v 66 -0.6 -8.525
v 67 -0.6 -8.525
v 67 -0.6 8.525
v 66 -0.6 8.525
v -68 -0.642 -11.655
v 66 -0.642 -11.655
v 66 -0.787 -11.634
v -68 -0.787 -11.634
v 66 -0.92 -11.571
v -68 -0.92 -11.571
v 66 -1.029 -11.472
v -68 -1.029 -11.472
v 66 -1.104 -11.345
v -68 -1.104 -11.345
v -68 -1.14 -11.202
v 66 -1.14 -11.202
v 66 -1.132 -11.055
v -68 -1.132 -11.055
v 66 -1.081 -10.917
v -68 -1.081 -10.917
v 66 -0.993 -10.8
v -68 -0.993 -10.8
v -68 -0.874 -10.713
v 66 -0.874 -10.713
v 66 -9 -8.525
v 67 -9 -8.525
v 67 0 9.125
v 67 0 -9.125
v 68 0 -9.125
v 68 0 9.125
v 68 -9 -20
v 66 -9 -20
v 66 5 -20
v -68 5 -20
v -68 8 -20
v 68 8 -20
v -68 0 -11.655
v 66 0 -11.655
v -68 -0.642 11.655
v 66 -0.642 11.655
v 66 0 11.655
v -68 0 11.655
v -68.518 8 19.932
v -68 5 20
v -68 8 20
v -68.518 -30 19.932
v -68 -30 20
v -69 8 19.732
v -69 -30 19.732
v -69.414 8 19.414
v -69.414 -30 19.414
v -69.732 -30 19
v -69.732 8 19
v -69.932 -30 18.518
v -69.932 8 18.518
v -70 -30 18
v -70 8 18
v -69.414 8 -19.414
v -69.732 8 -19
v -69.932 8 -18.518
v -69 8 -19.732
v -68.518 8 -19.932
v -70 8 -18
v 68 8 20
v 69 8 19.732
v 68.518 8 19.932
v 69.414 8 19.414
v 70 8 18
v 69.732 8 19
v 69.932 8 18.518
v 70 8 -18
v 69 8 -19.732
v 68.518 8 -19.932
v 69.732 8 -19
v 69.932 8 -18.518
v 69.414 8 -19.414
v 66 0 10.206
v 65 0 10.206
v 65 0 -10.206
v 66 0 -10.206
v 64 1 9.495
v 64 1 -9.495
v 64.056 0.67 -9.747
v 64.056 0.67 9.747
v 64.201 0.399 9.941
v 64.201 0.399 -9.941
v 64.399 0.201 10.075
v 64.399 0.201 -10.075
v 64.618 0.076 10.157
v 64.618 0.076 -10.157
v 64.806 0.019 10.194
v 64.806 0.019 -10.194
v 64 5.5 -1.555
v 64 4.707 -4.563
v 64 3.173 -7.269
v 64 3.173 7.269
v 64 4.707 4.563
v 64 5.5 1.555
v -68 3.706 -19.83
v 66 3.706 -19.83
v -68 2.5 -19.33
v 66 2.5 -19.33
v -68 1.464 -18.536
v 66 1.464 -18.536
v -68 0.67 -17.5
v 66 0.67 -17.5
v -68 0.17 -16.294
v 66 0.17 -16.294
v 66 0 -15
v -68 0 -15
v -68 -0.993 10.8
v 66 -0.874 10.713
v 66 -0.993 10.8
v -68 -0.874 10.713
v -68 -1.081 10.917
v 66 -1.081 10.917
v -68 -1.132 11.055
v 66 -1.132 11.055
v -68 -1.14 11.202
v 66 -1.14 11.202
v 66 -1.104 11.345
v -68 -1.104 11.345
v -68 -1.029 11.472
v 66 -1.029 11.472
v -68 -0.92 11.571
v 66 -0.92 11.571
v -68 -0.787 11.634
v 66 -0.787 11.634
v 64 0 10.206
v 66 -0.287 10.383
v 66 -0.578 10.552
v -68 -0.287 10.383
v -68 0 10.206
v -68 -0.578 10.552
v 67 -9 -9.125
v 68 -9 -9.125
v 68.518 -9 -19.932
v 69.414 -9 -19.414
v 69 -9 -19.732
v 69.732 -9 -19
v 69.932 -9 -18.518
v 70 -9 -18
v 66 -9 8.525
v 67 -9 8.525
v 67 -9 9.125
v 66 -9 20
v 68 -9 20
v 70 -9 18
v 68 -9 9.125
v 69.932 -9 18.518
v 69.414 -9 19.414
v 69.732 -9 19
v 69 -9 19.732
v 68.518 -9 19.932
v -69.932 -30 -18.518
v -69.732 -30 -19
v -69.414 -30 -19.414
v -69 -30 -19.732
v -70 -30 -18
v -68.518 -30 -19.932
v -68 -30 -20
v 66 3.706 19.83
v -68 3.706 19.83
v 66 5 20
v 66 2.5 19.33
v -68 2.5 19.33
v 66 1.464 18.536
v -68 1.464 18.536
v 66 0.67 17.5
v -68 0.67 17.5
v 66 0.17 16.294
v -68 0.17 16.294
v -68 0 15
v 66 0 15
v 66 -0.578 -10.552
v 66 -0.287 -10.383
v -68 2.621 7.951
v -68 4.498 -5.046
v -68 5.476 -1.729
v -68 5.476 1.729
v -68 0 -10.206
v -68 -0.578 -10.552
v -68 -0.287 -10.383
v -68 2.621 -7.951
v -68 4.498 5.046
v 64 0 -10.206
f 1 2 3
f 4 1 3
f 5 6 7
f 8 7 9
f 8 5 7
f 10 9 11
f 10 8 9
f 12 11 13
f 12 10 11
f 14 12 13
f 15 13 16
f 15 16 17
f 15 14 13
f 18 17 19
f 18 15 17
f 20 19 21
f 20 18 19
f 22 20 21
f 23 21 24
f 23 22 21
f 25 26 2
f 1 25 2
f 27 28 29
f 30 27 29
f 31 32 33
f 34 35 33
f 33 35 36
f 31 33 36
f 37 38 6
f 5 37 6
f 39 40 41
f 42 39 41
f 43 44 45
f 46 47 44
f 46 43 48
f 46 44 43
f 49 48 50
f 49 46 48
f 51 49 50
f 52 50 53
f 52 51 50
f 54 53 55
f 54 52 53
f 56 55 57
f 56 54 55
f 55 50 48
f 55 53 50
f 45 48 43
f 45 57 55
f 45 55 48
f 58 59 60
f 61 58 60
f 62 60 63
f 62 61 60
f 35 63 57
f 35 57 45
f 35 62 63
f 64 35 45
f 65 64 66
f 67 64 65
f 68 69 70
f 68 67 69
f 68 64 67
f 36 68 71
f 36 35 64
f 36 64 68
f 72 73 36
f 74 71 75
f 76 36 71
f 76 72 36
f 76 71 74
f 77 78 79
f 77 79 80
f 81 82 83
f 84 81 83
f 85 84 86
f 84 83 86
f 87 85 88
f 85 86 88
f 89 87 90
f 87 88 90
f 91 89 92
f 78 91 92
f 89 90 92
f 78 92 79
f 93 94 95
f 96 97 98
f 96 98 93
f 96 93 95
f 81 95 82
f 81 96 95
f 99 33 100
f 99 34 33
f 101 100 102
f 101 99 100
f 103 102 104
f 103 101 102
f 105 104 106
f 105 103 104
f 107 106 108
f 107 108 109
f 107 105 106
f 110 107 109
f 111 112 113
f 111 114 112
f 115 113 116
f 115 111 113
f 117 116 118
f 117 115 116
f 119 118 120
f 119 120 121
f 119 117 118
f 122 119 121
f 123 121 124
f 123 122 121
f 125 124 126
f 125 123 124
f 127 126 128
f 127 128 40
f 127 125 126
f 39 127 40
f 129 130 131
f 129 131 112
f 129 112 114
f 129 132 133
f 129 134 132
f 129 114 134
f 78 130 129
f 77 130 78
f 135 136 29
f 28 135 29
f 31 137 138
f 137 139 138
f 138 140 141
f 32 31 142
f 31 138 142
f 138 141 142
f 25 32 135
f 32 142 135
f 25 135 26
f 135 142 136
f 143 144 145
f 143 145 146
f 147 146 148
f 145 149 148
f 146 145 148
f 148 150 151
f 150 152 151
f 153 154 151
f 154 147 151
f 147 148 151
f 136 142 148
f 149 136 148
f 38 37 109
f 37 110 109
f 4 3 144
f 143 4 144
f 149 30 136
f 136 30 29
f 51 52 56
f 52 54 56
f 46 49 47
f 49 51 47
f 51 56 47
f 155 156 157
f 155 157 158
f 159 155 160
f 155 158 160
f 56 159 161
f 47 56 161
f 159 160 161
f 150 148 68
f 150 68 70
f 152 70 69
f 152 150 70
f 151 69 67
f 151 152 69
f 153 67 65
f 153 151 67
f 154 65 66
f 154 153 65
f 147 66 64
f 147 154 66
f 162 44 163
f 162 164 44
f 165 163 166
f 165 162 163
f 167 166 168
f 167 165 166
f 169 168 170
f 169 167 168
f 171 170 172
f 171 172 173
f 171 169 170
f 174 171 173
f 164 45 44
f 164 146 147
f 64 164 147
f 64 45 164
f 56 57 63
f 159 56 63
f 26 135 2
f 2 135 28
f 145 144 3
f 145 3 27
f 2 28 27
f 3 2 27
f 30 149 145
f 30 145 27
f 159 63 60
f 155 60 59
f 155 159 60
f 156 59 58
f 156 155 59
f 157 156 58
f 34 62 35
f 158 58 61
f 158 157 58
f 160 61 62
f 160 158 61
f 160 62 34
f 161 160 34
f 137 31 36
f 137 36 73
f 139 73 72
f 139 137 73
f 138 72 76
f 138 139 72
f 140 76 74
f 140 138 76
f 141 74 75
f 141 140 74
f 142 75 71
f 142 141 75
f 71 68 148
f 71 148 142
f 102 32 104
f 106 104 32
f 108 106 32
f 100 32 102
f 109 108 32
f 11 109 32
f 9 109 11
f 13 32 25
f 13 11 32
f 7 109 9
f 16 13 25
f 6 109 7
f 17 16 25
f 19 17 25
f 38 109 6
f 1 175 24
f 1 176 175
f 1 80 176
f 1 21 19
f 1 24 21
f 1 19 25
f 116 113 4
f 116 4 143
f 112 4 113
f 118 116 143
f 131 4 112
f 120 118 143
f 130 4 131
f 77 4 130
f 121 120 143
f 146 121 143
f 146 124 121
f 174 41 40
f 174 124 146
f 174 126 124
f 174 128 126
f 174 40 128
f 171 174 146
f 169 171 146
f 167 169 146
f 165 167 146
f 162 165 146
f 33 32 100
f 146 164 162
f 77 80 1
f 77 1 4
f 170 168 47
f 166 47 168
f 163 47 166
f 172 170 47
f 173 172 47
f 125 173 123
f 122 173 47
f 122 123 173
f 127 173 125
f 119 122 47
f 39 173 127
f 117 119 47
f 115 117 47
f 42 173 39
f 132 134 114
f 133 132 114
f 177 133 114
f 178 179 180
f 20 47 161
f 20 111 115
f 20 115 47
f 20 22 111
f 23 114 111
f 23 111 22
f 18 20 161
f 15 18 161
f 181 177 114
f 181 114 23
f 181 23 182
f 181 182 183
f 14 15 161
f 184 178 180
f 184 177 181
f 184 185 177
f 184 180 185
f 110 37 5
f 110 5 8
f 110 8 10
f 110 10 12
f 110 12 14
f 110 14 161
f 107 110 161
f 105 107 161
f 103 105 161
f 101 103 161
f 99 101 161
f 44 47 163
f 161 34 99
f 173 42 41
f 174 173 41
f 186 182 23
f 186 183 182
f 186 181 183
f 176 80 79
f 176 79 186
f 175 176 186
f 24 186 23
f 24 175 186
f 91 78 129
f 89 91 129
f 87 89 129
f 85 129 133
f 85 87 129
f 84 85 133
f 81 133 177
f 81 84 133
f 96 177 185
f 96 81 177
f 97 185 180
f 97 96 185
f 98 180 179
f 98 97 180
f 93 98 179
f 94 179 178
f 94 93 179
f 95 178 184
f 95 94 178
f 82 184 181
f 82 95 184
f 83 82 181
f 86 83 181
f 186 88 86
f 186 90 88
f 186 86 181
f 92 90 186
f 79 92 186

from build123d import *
from build123d.topology import SkipClean

# Parameters (mm, degrees)
SKETCH1_W           = 136
SKETCH1_H           = 40
SKETCH1_W_2         = 2
BOSS_EXTRUDE1_DEPTH = 8
SKETCH1_3_W         = 2
SKETCH1_3_H         = 40
BOSS_EXTRUDE2_DEPTH = 9
SKETCH2_W           = 10.875
SKETCH2_H           = 9
BOSS_EXTRUDE3_DEPTH = 1
BOSS_EXTRUDE4_START = 1
SKETCH2_3_W         = 10.875
SKETCH2_3_H         = 9
SKETCH2_3_W_2       = 17.05
SKETCH2_3_H_2       = 0.6
BOSS_EXTRUDE4_DEPTH = 1
SKETCH1_4_W         = 2
SKETCH1_4_H         = 40
BOSS_EXTRUDE5_DEPTH = 30
SKETCH3_R           = 12.1
CUT_EXTRUDE1_DEPTH  = 132
FILLET1_R           = 5
FILLET2_START       = -31
FILLET2_DEPTH       = 40
BOSS_EXTRUDE6_START = -2
BOSS_EXTRUDE6_DEPTH = 134
FILLET3_R           = 0.5
FILLET5_R           = 1


with BuildPart() as part:
    # Sketch1 → Boss-Extrude1 (new body)
    with BuildSketch(Plane(origin=(0, 0, 0), x_dir=(1, 0, 0), z_dir=(0, 1, 0))):
        Rectangle(SKETCH1_W, SKETCH1_H)
        with Locations((69, 0)):
            Rectangle(SKETCH1_W_2, SKETCH1_H)
        with Locations((-69, 0)):
            Rectangle(SKETCH1_W_2, SKETCH1_H)
    extrude(amount=BOSS_EXTRUDE1_DEPTH)

    # Sketch1<3> → Boss-Extrude2 (add)
    with BuildSketch(Plane(origin=(0, 0, 0), x_dir=(1, 0, 0), z_dir=(0, 1, 0))):
        with Locations((69, 0)):
            Rectangle(SKETCH1_3_W, SKETCH1_3_H)
    extrude(amount=-BOSS_EXTRUDE2_DEPTH)

    # Sketch2 → Boss-Extrude3 (add)
    with BuildSketch(Plane.ZY.offset(-68)):
        with Locations((14.5625, -4.5)):
            Rectangle(SKETCH2_W, SKETCH2_H)
        with Locations((-14.5625, -4.5)):
            Rectangle(SKETCH2_W, SKETCH2_H)
    extrude(amount=BOSS_EXTRUDE3_DEPTH)

    # Sketch2<3> → Boss-Extrude4 (add)
    with BuildSketch(Plane.ZY.offset(-68).offset(BOSS_EXTRUDE4_START)):
        Polygon((9.125, -9), (9.125, 0), (8.525, 0), (8.525, -0.6), (8.525, -9), align=None)
        with Locations((14.5625, -4.5)):
            Rectangle(SKETCH2_3_W, SKETCH2_3_H)
        with Locations((0, -0.3)):
            Rectangle(SKETCH2_3_W_2, SKETCH2_3_H_2)
        Polygon((-8.525, -0.6), (-8.525, 0), (-9.125, 0), (-9.125, -9), (-8.525, -9), align=None)
        with Locations((-14.5625, -4.5)):
            Rectangle(SKETCH2_3_W, SKETCH2_3_H)
    extrude(amount=BOSS_EXTRUDE4_DEPTH)

    # Sketch1<4> → Boss-Extrude5 (add)
    with BuildSketch(Plane(origin=(0, 0, 0), x_dir=(1, 0, 0), z_dir=(0, 1, 0))):
        with Locations((-69, 0)):
            Rectangle(SKETCH1_4_W, SKETCH1_4_H)
    extrude(amount=-BOSS_EXTRUDE5_DEPTH)

    # Sketch3 → Cut-Extrude1 (cut)
    with BuildSketch(Plane.ZY.offset(-64)):
        with Locations((0, -6.5)):
            Circle(SKETCH3_R)
    extrude(amount=CUT_EXTRUDE1_DEPTH, mode=Mode.SUBTRACT)

    # Fillet1
    fillet1_edges = [part.edges().sort_by_distance(p)[0] for p in [
        (-1, 0, -20),
        (-1, 0, 20),
    ]]
    fillet(fillet1_edges, radius=FILLET1_R)

    # Fillet2: read off the stored shape, not the designer's step
    # Fillet2 outline → Fillet2 (cut)
    with BuildSketch(Plane(origin=(0, 0, 0), x_dir=(1, 0, 0), z_dir=(0, 1, 0)).offset(FILLET2_START)):
        with BuildLine():
            Line((-70, -20), (-68, -20))
            ThreePointArc((-68, -20), (-69.414213562, -19.414213562), (-70, -18))
            Line((-70, -18), (-70, -20))
        make_face()
        with BuildLine():
            ThreePointArc((70, -18), (69.414213562, -19.414213562), (68, -20))
            Line((68, -20), (70, -20))
            Line((70, -20), (70, -18))
        make_face()
        with BuildLine():
            Line((-70, 20), (-70, 18))
            ThreePointArc((-70, 18), (-69.414213562, 19.414213562), (-68, 20))
            Line((-68, 20), (-70, 20))
        make_face()
        with BuildLine():
            ThreePointArc((68, 20), (69.414213562, 19.414213562), (70, 18))
            Line((70, 18), (70, 20))
            Line((70, 20), (68, 20))
        make_face()
    extrude(amount=FILLET2_DEPTH, mode=Mode.SUBTRACT)

    # Sketch3<3> → Boss-Extrude6 (add)
    with SkipClean():  # the faces are left unmerged after this step: merging them gives an invalid solid
        with BuildSketch(Plane.ZY.offset(-64).offset(BOSS_EXTRUDE6_START)):
            with BuildLine():
                Line((-11.655363572, 0), (-11.655363572, -3.25))
                ThreePointArc((-11.655363572, -3.25), (-11.050752229, -1.571422601), (-10.205880658, 0))
                Line((-10.205880658, 0), (-11.655363572, 0))
            make_face()
            with BuildLine():
                ThreePointArc((10.205880658, 0), (11.050752229, -1.571422601), (11.655363572, -3.25))
                Line((11.655363572, -3.25), (11.655363572, 0))
                Line((11.655363572, 0), (10.205880658, 0))
            make_face()
        extrude(amount=BOSS_EXTRUDE6_DEPTH)

    # Fillet3
    fillet3_edges = [part.edges().sort_by_distance(p)[0] for p in [
        (-1, -3.25, -11.655363572),
        (-1, -3.25, 11.655363572),
    ]]
    fillet(fillet3_edges, radius=FILLET3_R)

    # Fillet5
    # the kernel refuses this fillet: 1 mm, written as the material it takes off along each edge
    with BuildSketch(Plane(origin=(64, 0, -12.705880658), x_dir=(1, 0, 0), z_dir=(0, 0, 1))) as fillet5_piece_1_section:
        with BuildLine():
            CenterArc((FILLET5_R, FILLET5_R), FILLET5_R, 180, 90)
            Line((0, FILLET5_R), (0, 0))
            Line((0, 0), (FILLET5_R, 0))
        make_face()
    fillet5_piece_1 = extrude(amount=25.411761315, mode=Mode.PRIVATE)
    fillet5_piece_1 = fillet5_piece_1 & Plane(origin=(64, -6.5, 0), x_dir=(0, 0.5371900826446553, 0.8434612113833264), z_dir=(1, 0, 0)) * Cylinder(12.1, 55, mode=Mode.PRIVATE)
    add(fillet5_piece_1, mode=Mode.SUBTRACT)


solid = part.part
